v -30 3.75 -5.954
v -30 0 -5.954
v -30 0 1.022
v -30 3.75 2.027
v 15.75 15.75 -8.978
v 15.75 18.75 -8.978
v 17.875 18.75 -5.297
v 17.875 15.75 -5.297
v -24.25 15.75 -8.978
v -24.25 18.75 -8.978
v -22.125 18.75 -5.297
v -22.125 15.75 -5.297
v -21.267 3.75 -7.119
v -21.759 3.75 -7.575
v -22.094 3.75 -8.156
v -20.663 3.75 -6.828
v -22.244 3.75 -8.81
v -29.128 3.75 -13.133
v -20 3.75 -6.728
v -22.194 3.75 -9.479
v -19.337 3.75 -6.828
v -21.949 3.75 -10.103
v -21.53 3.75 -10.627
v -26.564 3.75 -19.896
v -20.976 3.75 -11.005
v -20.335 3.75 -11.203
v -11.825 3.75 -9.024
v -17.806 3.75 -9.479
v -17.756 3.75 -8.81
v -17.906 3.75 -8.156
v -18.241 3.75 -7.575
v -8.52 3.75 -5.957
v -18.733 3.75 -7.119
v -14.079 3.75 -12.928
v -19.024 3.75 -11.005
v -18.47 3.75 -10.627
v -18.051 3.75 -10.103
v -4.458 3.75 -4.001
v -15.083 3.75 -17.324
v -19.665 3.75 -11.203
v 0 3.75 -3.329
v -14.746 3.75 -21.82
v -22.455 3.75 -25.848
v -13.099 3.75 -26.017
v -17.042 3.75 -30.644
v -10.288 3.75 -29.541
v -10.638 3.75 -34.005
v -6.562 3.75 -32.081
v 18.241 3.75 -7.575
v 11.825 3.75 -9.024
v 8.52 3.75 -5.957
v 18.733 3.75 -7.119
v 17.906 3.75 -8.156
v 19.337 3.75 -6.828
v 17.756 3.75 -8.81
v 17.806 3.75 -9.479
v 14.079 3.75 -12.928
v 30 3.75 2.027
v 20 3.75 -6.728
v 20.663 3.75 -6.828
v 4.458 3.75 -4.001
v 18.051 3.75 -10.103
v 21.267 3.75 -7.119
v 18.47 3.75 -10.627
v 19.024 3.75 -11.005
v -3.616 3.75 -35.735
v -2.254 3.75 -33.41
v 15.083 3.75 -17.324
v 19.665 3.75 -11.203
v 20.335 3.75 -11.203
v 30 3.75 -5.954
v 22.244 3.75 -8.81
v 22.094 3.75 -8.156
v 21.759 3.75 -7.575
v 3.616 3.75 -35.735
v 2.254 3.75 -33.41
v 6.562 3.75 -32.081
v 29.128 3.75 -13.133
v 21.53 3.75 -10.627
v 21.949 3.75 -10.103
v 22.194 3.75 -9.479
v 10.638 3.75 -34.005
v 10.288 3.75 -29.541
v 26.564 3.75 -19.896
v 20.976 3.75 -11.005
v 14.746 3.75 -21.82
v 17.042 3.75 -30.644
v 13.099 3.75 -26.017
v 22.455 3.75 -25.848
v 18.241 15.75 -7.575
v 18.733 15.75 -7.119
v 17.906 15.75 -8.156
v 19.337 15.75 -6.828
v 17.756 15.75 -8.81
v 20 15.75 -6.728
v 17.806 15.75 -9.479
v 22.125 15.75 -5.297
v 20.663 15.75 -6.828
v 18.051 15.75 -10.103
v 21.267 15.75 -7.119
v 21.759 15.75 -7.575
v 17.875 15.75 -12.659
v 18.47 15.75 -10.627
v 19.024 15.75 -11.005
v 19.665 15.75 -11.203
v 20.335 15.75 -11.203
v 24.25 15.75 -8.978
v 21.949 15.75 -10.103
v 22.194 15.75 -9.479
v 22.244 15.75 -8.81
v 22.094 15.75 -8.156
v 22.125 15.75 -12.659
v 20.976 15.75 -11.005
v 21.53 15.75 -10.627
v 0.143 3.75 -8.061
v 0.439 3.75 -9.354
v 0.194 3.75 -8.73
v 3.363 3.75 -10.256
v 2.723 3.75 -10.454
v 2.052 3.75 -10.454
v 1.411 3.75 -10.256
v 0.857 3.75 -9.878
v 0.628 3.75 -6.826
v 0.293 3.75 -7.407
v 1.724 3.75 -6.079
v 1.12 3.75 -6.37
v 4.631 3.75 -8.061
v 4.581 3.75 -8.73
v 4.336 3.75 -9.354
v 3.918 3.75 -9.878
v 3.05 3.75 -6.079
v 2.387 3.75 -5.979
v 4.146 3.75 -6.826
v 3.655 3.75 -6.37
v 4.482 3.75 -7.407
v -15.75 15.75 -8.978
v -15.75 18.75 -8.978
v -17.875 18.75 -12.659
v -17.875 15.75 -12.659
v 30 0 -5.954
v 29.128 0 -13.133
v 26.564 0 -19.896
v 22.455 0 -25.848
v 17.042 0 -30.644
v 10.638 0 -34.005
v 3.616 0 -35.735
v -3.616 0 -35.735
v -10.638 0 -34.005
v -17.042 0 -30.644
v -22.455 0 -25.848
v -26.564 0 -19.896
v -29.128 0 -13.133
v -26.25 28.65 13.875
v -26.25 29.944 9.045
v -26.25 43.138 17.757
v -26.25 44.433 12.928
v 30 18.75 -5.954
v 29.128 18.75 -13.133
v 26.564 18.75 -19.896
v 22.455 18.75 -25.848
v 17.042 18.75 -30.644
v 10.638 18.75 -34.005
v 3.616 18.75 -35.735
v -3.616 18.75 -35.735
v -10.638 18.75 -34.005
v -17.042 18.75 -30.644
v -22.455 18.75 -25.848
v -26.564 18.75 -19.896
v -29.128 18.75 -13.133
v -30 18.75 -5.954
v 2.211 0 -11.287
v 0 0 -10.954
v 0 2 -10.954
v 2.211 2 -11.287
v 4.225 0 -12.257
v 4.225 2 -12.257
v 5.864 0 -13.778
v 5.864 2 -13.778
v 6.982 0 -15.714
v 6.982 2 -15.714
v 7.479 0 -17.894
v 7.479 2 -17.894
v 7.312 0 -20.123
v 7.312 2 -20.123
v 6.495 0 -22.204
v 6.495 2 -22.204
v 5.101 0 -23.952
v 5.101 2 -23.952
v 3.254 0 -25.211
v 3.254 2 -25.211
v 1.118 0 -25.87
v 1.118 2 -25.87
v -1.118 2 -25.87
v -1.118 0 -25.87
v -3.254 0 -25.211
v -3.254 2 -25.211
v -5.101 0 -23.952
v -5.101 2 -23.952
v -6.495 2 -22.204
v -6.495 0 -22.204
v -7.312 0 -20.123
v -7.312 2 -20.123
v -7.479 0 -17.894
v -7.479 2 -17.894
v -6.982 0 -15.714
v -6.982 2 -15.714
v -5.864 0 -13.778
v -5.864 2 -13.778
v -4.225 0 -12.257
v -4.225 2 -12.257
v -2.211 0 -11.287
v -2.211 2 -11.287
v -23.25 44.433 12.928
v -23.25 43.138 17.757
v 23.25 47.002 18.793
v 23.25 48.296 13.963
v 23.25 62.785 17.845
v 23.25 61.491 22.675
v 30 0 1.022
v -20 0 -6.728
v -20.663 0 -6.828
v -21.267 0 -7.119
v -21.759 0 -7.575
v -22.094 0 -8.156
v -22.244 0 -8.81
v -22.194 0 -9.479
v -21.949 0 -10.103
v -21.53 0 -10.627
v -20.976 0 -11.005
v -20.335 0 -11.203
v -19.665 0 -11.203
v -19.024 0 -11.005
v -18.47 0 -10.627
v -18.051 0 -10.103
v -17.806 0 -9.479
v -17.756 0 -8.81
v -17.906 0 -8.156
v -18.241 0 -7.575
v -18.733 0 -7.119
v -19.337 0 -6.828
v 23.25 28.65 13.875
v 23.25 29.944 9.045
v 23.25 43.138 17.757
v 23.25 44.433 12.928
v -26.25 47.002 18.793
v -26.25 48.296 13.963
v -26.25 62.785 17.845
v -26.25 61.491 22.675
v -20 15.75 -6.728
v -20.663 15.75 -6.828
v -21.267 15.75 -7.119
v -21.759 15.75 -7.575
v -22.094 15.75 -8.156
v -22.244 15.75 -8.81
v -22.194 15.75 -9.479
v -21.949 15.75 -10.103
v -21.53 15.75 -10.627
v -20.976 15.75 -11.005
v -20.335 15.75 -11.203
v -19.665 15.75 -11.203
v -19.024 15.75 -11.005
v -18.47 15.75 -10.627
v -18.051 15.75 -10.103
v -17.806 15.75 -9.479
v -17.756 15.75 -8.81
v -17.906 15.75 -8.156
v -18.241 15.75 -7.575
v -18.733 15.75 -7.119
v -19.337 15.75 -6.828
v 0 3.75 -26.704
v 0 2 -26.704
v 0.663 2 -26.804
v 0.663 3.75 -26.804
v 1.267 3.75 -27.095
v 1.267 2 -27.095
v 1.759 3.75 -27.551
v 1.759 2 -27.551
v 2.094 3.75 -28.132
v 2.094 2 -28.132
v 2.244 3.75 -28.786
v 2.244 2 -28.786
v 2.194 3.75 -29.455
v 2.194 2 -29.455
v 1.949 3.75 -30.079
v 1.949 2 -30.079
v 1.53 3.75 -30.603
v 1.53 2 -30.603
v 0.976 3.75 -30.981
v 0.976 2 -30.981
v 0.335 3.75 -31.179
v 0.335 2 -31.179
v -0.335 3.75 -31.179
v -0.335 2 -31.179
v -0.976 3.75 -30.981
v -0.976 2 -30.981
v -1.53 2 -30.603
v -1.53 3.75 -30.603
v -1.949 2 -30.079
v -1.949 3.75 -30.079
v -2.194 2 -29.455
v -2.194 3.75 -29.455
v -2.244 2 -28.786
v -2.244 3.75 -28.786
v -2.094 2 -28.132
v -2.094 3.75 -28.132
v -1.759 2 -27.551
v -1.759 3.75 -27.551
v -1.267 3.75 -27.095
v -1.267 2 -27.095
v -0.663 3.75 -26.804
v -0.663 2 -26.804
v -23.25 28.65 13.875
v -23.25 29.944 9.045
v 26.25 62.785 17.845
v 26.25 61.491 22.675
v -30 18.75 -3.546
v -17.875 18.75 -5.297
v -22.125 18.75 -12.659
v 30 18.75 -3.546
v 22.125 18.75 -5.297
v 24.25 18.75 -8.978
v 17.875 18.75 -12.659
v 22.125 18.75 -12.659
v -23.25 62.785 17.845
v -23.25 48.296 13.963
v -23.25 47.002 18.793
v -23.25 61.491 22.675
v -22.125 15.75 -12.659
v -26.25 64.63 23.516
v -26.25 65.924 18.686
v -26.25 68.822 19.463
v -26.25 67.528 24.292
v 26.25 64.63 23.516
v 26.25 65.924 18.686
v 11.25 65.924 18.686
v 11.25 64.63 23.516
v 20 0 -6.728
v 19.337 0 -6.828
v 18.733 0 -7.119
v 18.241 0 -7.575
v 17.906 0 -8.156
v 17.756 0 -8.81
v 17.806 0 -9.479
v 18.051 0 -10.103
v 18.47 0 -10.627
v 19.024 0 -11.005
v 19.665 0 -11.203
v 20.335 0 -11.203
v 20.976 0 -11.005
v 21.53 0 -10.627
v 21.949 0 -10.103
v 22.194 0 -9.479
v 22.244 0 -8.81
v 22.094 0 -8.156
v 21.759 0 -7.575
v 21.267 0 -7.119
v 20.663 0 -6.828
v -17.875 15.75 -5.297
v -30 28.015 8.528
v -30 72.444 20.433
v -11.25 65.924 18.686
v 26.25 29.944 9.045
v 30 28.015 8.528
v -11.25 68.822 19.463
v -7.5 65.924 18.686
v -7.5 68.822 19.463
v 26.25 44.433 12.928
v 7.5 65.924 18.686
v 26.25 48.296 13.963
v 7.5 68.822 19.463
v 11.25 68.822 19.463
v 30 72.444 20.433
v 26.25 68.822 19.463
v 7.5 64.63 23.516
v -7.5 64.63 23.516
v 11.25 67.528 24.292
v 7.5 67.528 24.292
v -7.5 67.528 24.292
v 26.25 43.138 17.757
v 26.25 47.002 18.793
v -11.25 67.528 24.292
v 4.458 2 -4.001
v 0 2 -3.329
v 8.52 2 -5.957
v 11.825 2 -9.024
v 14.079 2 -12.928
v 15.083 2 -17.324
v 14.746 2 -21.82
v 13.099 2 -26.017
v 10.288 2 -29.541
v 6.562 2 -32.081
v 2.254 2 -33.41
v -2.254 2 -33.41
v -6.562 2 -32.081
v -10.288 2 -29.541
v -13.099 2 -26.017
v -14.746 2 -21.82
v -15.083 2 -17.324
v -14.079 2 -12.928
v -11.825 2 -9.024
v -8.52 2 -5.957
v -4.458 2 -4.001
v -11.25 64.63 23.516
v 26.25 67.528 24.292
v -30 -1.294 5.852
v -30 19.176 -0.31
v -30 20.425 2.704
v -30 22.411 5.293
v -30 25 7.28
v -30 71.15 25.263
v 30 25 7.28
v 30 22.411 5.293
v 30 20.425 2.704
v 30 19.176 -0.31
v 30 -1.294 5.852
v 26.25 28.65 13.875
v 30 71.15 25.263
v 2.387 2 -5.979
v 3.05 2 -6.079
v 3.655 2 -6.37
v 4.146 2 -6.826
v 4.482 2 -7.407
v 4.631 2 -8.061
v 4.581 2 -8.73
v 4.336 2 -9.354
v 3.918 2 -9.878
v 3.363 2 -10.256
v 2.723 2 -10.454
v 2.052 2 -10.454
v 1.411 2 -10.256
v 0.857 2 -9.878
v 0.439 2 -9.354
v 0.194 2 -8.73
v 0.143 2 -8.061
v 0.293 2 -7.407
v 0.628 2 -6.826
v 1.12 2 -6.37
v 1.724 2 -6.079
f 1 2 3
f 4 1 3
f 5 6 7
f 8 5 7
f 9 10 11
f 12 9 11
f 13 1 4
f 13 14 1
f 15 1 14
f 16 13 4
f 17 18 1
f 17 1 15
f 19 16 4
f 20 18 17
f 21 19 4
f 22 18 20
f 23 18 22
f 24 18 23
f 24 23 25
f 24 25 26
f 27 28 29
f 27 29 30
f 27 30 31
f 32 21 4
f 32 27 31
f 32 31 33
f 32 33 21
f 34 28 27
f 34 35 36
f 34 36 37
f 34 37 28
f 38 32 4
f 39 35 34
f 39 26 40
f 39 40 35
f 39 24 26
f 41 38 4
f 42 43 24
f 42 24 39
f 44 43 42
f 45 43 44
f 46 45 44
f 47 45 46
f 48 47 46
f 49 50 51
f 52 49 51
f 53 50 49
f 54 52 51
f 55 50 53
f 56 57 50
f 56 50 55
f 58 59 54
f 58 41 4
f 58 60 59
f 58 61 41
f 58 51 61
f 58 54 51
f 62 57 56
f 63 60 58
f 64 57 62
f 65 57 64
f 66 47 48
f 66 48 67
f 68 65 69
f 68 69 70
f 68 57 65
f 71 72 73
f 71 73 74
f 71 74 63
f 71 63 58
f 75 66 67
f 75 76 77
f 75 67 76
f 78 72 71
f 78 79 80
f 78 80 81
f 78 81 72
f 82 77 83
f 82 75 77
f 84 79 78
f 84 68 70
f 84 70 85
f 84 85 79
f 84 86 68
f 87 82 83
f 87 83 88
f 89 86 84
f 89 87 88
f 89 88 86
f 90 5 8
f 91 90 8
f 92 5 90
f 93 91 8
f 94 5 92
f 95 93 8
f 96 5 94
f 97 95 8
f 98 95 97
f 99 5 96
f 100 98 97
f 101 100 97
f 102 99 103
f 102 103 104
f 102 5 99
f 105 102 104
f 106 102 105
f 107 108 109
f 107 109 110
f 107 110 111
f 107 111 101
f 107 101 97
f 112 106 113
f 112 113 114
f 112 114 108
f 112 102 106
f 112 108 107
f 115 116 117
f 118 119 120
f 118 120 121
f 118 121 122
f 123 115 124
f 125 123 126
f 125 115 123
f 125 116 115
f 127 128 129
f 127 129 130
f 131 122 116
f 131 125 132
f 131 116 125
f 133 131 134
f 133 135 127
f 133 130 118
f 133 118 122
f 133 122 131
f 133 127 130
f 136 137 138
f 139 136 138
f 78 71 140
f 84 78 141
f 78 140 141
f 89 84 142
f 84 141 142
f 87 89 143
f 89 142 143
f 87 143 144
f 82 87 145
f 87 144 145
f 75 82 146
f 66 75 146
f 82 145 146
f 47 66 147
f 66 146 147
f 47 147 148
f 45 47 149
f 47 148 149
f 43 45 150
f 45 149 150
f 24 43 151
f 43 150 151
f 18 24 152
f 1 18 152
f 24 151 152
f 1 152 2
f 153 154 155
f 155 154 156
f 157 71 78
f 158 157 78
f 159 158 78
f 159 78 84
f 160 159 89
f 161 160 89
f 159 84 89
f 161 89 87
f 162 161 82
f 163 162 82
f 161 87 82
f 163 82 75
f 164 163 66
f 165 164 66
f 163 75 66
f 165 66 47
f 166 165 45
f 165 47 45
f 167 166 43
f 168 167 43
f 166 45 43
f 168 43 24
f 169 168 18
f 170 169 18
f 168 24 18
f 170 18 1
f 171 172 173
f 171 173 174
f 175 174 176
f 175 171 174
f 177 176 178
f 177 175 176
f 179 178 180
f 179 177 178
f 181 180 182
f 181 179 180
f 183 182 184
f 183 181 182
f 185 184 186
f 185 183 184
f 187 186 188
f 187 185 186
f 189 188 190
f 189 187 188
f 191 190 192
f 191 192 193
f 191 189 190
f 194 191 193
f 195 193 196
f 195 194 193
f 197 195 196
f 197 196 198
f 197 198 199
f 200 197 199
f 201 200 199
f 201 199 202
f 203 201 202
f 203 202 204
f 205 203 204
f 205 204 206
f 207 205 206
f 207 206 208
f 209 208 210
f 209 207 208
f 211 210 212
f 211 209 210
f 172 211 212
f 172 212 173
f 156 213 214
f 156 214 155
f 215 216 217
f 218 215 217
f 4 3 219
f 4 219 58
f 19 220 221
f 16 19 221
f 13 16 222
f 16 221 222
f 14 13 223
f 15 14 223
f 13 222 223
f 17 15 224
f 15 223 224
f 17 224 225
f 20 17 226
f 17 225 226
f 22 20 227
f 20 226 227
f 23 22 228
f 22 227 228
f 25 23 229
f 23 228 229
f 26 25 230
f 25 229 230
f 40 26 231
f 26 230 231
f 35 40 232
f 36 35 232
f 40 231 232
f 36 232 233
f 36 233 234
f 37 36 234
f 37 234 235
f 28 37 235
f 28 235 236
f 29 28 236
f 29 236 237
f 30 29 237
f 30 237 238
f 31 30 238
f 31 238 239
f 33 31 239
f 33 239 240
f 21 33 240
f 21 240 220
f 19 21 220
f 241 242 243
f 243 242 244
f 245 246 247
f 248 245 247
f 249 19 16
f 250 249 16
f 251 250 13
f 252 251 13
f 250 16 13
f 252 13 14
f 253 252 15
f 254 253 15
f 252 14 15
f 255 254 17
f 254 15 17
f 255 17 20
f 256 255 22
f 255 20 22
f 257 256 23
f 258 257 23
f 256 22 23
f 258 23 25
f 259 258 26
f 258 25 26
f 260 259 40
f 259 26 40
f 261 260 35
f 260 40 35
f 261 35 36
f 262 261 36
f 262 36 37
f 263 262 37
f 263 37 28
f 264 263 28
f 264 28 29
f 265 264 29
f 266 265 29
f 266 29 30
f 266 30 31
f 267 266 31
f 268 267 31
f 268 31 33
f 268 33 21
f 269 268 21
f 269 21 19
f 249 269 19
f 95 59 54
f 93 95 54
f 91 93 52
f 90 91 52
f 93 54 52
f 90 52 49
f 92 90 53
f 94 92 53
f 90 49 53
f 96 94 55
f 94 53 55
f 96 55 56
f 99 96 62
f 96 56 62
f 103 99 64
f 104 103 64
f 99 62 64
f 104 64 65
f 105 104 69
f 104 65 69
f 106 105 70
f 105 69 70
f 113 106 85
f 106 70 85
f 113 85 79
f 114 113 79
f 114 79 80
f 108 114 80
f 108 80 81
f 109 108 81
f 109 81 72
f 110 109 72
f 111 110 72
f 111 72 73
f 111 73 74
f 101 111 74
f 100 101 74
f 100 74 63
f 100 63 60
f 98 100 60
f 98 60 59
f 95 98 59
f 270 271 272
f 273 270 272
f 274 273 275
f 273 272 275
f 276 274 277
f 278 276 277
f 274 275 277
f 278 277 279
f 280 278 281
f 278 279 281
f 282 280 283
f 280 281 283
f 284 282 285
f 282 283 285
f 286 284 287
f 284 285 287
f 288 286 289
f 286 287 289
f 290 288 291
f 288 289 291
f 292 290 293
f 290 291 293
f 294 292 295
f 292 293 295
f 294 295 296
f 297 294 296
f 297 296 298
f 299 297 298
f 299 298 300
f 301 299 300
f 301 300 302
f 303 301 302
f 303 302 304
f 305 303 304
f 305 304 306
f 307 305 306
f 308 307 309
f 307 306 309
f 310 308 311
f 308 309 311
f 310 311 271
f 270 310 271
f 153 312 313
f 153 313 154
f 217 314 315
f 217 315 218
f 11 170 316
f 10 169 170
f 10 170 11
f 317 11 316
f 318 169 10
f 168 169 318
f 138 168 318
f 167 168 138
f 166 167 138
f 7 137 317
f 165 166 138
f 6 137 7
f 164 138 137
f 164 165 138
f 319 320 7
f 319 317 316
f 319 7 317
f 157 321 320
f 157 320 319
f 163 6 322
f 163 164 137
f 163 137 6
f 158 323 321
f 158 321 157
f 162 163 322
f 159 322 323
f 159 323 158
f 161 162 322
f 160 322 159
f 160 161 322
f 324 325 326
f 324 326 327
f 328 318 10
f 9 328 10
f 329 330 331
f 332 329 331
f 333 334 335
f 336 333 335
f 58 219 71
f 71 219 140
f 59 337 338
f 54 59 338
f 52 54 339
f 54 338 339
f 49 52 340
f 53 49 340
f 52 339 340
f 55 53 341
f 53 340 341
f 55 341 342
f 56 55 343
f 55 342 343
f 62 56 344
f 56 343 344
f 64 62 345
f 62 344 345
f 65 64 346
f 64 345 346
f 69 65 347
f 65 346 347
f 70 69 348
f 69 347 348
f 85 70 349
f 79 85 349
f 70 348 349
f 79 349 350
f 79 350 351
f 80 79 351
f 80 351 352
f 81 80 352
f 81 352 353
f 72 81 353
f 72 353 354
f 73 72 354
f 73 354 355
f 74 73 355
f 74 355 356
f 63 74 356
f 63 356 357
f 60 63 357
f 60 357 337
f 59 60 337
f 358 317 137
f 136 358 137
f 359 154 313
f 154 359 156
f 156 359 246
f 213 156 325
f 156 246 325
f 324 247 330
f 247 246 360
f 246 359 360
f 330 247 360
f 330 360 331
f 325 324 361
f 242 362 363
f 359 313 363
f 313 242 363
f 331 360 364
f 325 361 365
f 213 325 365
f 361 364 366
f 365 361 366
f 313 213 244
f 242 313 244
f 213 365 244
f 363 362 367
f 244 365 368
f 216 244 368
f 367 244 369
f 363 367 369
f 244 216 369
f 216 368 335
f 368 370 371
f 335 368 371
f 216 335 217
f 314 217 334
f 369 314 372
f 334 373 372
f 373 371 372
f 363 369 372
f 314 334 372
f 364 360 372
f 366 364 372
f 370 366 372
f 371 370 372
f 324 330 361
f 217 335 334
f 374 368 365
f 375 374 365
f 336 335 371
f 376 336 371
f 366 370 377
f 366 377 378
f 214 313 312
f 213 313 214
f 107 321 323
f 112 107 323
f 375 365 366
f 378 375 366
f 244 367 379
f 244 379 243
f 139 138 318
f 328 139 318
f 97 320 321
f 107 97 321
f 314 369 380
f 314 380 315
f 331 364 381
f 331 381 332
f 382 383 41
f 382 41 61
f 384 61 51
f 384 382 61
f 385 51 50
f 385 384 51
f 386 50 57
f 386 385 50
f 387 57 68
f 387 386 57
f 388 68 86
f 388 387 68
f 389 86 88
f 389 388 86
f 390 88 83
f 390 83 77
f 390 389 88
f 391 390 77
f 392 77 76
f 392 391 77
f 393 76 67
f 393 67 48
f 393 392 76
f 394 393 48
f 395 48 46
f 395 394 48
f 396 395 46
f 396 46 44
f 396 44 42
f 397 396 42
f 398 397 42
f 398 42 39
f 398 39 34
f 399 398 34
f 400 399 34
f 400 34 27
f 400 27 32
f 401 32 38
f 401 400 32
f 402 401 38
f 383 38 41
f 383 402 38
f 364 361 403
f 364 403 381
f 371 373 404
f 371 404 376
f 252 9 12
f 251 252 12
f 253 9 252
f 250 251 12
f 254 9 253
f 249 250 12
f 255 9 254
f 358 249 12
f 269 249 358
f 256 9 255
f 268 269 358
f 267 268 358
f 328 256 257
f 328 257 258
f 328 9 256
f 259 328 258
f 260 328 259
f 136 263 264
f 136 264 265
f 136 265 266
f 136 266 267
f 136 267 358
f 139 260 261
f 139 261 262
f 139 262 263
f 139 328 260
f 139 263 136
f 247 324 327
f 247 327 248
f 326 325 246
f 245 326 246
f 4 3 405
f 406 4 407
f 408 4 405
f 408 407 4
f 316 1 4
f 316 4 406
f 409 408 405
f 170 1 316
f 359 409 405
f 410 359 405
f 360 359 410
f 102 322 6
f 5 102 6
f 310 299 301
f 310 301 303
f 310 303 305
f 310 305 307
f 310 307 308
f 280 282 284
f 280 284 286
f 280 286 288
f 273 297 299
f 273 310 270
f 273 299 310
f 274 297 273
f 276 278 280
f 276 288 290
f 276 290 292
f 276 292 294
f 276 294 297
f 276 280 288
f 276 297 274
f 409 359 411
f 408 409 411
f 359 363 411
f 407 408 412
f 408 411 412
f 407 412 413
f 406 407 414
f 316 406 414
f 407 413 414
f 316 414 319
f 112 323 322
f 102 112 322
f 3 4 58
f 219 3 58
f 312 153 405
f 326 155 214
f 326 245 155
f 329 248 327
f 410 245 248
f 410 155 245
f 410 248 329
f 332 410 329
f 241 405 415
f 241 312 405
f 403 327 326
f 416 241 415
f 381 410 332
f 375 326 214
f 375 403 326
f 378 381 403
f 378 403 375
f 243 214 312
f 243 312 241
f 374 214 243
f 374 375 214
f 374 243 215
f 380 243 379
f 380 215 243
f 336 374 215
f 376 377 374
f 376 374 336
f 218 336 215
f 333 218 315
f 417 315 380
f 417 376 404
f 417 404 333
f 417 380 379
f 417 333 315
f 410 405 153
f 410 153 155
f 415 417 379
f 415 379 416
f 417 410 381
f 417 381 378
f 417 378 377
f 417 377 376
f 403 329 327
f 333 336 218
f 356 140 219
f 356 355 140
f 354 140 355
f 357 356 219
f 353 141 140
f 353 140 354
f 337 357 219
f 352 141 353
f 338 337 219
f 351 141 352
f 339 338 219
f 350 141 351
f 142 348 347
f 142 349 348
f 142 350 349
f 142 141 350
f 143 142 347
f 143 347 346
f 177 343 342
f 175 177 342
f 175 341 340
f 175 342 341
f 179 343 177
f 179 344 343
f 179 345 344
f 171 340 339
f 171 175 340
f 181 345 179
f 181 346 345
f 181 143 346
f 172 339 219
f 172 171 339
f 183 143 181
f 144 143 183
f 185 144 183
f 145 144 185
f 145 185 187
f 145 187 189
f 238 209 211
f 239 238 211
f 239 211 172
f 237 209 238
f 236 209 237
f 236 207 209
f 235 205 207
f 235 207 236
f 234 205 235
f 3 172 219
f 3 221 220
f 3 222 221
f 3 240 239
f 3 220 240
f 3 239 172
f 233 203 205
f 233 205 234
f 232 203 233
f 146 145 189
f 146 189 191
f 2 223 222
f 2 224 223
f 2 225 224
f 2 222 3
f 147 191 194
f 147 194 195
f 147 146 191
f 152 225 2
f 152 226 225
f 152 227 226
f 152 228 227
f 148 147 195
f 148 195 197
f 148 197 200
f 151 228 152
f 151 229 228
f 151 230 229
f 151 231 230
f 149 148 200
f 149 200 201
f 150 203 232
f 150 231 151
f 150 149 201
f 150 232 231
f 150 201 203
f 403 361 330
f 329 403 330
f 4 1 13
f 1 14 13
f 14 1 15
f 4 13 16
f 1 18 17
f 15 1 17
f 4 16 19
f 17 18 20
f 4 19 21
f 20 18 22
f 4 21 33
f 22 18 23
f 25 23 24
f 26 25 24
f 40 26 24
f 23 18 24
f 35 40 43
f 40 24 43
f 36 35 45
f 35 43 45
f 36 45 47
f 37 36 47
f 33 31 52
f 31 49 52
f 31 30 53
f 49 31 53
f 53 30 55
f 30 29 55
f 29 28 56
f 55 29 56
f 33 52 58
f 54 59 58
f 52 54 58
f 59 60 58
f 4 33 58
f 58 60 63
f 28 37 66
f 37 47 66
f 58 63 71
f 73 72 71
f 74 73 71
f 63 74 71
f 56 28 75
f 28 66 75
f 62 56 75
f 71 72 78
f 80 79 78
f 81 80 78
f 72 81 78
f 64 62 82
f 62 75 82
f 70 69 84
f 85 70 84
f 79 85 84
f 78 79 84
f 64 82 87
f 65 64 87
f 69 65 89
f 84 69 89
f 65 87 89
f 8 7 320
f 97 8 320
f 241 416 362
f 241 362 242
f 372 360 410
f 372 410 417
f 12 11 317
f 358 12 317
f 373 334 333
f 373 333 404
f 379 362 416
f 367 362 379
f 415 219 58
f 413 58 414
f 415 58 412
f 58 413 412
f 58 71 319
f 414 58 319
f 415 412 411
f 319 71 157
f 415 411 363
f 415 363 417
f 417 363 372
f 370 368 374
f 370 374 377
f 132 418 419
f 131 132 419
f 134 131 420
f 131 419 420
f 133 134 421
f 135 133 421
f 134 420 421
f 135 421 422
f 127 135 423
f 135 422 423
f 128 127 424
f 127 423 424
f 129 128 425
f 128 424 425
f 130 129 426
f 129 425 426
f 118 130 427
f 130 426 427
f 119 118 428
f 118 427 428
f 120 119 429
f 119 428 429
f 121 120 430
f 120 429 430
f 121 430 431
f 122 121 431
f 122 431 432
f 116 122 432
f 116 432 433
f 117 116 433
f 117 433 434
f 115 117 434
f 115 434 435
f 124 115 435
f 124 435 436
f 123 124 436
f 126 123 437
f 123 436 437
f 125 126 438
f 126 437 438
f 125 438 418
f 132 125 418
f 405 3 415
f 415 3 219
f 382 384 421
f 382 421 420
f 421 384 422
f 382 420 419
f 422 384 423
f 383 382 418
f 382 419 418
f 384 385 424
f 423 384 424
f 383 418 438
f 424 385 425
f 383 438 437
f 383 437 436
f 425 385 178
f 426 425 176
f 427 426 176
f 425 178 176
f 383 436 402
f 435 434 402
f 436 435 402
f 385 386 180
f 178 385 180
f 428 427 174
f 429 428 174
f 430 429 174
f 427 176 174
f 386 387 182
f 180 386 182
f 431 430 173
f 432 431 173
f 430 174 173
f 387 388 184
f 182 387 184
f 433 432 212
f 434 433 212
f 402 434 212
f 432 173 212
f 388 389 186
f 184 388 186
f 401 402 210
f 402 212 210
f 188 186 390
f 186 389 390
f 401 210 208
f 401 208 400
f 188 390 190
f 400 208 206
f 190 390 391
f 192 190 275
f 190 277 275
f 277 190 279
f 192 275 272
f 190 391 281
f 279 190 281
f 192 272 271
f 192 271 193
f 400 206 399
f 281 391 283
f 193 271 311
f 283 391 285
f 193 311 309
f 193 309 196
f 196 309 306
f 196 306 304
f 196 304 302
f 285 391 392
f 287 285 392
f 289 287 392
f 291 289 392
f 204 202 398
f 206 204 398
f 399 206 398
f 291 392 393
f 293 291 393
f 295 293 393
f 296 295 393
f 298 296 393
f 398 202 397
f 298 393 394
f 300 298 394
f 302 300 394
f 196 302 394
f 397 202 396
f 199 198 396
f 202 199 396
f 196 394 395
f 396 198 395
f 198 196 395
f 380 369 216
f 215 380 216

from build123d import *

# Parameters (mm, degrees)
SKETCH1_R           = 7.5
BOSS_EXTRUDE1_DEPTH = 2
SKETCH2_R           = 15.125
SKETCH2_R_2         = 2.25
BOSS_EXTRUDE2_DEPTH = 1.75
BOSS_EXTRUDE3_DEPTH = 15
CUT_EXTRUDE2_DEPTH  = 60
SKETCH8_W           = 60
SKETCH8_H           = 75
BOSS_EXTRUDE4_DEPTH = 5
SKETCH9_R           = 2.25
CUT_EXTRUDE4_DEPTH  = 20
SKETCH10_W          = 15
SKETCH10_H          = 3
SKETCH10_W_2        = 3
SKETCH10_H_2        = 15
CUT_EXTRUDE5_DEPTH  = 25
CUT_EXTRUDE6_DEPTH  = 3
FILLET1_R           = 12.5


with BuildPart() as part:
    # Sketch1 → Boss-Extrude1 (new body)
    with BuildSketch(Plane(origin=(0, 0, 0), x_dir=(1, 0, 0), z_dir=(0, 1, 0))):
        with BuildLine():
            Line((30, -6.04597789), (-30, -6.04597789))
            Line((-30, -6.04597789), (-30, 5.95402211))
            ThreePointArc((-30, 5.95402211), (0, 35.95402211), (30, 5.95402211))
            Line((30, 5.95402211), (30, -6.04597789))
        make_face()
        with Locations(Location((0, 18.45402211, 0), (0, 0, 270))):
            Circle(SKETCH1_R, mode=Mode.SUBTRACT)
    extrude(amount=BOSS_EXTRUDE1_DEPTH)

    # Sketch2 → Boss-Extrude2 (add)
    # profile 1 of 3: a face of its own
    with BuildSketch(Plane(origin=(0, 2, 0), x_dir=(1, 0, 0), z_dir=(0, 1, 0))):
        with BuildLine():
            Line((-30, -6.04597789), (30, -6.04597789))
            Line((30, -6.04597789), (30, 5.95402211))
            ThreePointArc((30, 5.95402211), (0, 35.95402211), (-30, 5.95402211))
            Line((-30, 5.95402211), (-30, -6.04597789))
        make_face()
        with Locations(Location((0, 18.45402211, 0), (0, 0, 270))):
            Circle(SKETCH2_R, mode=Mode.SUBTRACT)
    # profile 2 of 3: a face of its own
    with BuildSketch(Plane(origin=(0, 2, 0), x_dir=(1, 0, 0), z_dir=(0, 1, 0))):
        with Locations(Location((0, 28.95402211, 0), (0, 0, 270))):
            Circle(SKETCH2_R_2)
    # profile 3 of 3: a face of its own
    with BuildSketch(Plane(origin=(0, 2, 0), x_dir=(1, 0, 0), z_dir=(0, 1, 0))):
        with Locations(Location((2.387171141, 8.228983531, 0), (0, 0, 270))):
            Circle(SKETCH2_R_2)
    extrude(amount=BOSS_EXTRUDE2_DEPTH)


with BuildPart() as body_2:
    # Sketch5 → Boss-Extrude3 (new body)
    with BuildSketch(Plane(origin=(0, 3.75, 0), x_dir=(1, 0, 0), z_dir=(0, 1, 0))):
        with BuildLine():
            Line((-30, -6.04597789), (30, -6.04597789))
            Line((30, -6.04597789), (30, 5.95402211))
            ThreePointArc((30, 5.95402211), (0, 35.95402211), (-30, 5.95402211))
            Line((-30, 5.95402211), (-30, -6.04597789))
        make_face()
    extrude(amount=BOSS_EXTRUDE3_DEPTH)


with BuildPart() as cut_extrude2_tool:
    # Sketch6 → Cut-Extrude2 (new body)
    with BuildSketch(Plane.ZY.offset(30)):
        Polygon((6.04597789, 18.75), (6.04597789, 0), (1.021930531, 0), align=None)
    extrude(amount=-CUT_EXTRUDE2_DEPTH)


with BuildPart() as part_1:
    add(part.part)

    # Cut-Extrude2: cut by cut_extrude2_tool
    add(cut_extrude2_tool.part, mode=Mode.SUBTRACT)


with BuildPart() as body_2_1:
    add(body_2.part)

    # Cut-Extrude2: cut by cut_extrude2_tool
    add(cut_extrude2_tool.part, mode=Mode.SUBTRACT)

    # Sketch8 → Boss-Extrude4 (add)
    with BuildSketch(Plane(origin=(0, -0.255482633, 0.953474166), x_dir=(1, 0, 0), z_dir=(0, -0.25881904510252135, 0.9659258262890681))):
        with Locations((0, 37.764495084)):
            Rectangle(SKETCH8_W, SKETCH8_H)
    extrude(amount=BOSS_EXTRUDE4_DEPTH)


with BuildPart() as cut_extrude4_tool:
    # Sketch9 → Cut-Extrude4 (new body)
    with BuildSketch(Plane.XZ):
        with Locations(Location((-20, -8.978069469, 0), (0, 0, 90))):
            Circle(SKETCH9_R)
        with Locations(Location((20, -8.978069469, 0), (0, 0, 90))):
            Circle(SKETCH9_R)
    extrude(amount=-CUT_EXTRUDE4_DEPTH)


with BuildPart() as part_2:
    add(part_1.part)

    # Cut-Extrude4: cut by cut_extrude4_tool
    add(cut_extrude4_tool.part, mode=Mode.SUBTRACT)


with BuildPart() as body_2_2:
    add(body_2_1.part)

    # Cut-Extrude4: cut by cut_extrude4_tool
    add(cut_extrude4_tool.part, mode=Mode.SUBTRACT)

    # Sketch10 → Cut-Extrude5 (cut)
    with BuildSketch(Plane(origin=(0, -0.255482633, 0.953474166), x_dir=(-1, 0, 0), z_dir=(0, 0.25881904510252135, -0.9659258262890681))):
        with Locations((-18.75, 70.014495084)):
            Rectangle(SKETCH10_W, SKETCH10_H)
        with Locations((0, 70.014495084)):
            Rectangle(SKETCH10_W, SKETCH10_H)
        with Locations((18.75, 70.014495084)):
            Rectangle(SKETCH10_W, SKETCH10_H)
        with Locations((-24.75, 38.764495084)):
            Rectangle(SKETCH10_W_2, SKETCH10_H_2)
        with Locations((-24.75, 57.764495084)):
            Rectangle(SKETCH10_W_2, SKETCH10_H_2)
        with Locations((24.75, 38.764495084)):
            Rectangle(SKETCH10_W_2, SKETCH10_H_2)
        with Locations((24.75, 57.764495084)):
            Rectangle(SKETCH10_W_2, SKETCH10_H_2)
    extrude(amount=-CUT_EXTRUDE5_DEPTH, mode=Mode.SUBTRACT)

    # Sketch11 → Cut-Extrude6 (cut)
    with BuildSketch(Plane(origin=(0, 18.75, 0), x_dir=(1, 0, 0), z_dir=(0, 1, 0))):
        Polygon((-17.875, 12.658677435), (-22.125, 12.658677435), (-24.25, 8.978069469), (-22.125, 5.297461502), (-17.875, 5.297461502), (-15.75, 8.978069469), align=None)
        Polygon((22.125, 12.658677435), (17.875, 12.658677435), (15.75, 8.978069469), (17.875, 5.297461502), (22.125, 5.297461502), (24.25, 8.978069469), align=None)
    extrude(amount=-CUT_EXTRUDE6_DEPTH, mode=Mode.SUBTRACT)

    # Fillet1
    fillet1_edges = [body_2_2.edges().sort_by_distance(p)[0] for p in [
        (0, 18.75, 6.04597789),
    ]]
    fillet(fillet1_edges, radius=FILLET1_R)


solid = Compound([part_2.part, body_2_2.part])
